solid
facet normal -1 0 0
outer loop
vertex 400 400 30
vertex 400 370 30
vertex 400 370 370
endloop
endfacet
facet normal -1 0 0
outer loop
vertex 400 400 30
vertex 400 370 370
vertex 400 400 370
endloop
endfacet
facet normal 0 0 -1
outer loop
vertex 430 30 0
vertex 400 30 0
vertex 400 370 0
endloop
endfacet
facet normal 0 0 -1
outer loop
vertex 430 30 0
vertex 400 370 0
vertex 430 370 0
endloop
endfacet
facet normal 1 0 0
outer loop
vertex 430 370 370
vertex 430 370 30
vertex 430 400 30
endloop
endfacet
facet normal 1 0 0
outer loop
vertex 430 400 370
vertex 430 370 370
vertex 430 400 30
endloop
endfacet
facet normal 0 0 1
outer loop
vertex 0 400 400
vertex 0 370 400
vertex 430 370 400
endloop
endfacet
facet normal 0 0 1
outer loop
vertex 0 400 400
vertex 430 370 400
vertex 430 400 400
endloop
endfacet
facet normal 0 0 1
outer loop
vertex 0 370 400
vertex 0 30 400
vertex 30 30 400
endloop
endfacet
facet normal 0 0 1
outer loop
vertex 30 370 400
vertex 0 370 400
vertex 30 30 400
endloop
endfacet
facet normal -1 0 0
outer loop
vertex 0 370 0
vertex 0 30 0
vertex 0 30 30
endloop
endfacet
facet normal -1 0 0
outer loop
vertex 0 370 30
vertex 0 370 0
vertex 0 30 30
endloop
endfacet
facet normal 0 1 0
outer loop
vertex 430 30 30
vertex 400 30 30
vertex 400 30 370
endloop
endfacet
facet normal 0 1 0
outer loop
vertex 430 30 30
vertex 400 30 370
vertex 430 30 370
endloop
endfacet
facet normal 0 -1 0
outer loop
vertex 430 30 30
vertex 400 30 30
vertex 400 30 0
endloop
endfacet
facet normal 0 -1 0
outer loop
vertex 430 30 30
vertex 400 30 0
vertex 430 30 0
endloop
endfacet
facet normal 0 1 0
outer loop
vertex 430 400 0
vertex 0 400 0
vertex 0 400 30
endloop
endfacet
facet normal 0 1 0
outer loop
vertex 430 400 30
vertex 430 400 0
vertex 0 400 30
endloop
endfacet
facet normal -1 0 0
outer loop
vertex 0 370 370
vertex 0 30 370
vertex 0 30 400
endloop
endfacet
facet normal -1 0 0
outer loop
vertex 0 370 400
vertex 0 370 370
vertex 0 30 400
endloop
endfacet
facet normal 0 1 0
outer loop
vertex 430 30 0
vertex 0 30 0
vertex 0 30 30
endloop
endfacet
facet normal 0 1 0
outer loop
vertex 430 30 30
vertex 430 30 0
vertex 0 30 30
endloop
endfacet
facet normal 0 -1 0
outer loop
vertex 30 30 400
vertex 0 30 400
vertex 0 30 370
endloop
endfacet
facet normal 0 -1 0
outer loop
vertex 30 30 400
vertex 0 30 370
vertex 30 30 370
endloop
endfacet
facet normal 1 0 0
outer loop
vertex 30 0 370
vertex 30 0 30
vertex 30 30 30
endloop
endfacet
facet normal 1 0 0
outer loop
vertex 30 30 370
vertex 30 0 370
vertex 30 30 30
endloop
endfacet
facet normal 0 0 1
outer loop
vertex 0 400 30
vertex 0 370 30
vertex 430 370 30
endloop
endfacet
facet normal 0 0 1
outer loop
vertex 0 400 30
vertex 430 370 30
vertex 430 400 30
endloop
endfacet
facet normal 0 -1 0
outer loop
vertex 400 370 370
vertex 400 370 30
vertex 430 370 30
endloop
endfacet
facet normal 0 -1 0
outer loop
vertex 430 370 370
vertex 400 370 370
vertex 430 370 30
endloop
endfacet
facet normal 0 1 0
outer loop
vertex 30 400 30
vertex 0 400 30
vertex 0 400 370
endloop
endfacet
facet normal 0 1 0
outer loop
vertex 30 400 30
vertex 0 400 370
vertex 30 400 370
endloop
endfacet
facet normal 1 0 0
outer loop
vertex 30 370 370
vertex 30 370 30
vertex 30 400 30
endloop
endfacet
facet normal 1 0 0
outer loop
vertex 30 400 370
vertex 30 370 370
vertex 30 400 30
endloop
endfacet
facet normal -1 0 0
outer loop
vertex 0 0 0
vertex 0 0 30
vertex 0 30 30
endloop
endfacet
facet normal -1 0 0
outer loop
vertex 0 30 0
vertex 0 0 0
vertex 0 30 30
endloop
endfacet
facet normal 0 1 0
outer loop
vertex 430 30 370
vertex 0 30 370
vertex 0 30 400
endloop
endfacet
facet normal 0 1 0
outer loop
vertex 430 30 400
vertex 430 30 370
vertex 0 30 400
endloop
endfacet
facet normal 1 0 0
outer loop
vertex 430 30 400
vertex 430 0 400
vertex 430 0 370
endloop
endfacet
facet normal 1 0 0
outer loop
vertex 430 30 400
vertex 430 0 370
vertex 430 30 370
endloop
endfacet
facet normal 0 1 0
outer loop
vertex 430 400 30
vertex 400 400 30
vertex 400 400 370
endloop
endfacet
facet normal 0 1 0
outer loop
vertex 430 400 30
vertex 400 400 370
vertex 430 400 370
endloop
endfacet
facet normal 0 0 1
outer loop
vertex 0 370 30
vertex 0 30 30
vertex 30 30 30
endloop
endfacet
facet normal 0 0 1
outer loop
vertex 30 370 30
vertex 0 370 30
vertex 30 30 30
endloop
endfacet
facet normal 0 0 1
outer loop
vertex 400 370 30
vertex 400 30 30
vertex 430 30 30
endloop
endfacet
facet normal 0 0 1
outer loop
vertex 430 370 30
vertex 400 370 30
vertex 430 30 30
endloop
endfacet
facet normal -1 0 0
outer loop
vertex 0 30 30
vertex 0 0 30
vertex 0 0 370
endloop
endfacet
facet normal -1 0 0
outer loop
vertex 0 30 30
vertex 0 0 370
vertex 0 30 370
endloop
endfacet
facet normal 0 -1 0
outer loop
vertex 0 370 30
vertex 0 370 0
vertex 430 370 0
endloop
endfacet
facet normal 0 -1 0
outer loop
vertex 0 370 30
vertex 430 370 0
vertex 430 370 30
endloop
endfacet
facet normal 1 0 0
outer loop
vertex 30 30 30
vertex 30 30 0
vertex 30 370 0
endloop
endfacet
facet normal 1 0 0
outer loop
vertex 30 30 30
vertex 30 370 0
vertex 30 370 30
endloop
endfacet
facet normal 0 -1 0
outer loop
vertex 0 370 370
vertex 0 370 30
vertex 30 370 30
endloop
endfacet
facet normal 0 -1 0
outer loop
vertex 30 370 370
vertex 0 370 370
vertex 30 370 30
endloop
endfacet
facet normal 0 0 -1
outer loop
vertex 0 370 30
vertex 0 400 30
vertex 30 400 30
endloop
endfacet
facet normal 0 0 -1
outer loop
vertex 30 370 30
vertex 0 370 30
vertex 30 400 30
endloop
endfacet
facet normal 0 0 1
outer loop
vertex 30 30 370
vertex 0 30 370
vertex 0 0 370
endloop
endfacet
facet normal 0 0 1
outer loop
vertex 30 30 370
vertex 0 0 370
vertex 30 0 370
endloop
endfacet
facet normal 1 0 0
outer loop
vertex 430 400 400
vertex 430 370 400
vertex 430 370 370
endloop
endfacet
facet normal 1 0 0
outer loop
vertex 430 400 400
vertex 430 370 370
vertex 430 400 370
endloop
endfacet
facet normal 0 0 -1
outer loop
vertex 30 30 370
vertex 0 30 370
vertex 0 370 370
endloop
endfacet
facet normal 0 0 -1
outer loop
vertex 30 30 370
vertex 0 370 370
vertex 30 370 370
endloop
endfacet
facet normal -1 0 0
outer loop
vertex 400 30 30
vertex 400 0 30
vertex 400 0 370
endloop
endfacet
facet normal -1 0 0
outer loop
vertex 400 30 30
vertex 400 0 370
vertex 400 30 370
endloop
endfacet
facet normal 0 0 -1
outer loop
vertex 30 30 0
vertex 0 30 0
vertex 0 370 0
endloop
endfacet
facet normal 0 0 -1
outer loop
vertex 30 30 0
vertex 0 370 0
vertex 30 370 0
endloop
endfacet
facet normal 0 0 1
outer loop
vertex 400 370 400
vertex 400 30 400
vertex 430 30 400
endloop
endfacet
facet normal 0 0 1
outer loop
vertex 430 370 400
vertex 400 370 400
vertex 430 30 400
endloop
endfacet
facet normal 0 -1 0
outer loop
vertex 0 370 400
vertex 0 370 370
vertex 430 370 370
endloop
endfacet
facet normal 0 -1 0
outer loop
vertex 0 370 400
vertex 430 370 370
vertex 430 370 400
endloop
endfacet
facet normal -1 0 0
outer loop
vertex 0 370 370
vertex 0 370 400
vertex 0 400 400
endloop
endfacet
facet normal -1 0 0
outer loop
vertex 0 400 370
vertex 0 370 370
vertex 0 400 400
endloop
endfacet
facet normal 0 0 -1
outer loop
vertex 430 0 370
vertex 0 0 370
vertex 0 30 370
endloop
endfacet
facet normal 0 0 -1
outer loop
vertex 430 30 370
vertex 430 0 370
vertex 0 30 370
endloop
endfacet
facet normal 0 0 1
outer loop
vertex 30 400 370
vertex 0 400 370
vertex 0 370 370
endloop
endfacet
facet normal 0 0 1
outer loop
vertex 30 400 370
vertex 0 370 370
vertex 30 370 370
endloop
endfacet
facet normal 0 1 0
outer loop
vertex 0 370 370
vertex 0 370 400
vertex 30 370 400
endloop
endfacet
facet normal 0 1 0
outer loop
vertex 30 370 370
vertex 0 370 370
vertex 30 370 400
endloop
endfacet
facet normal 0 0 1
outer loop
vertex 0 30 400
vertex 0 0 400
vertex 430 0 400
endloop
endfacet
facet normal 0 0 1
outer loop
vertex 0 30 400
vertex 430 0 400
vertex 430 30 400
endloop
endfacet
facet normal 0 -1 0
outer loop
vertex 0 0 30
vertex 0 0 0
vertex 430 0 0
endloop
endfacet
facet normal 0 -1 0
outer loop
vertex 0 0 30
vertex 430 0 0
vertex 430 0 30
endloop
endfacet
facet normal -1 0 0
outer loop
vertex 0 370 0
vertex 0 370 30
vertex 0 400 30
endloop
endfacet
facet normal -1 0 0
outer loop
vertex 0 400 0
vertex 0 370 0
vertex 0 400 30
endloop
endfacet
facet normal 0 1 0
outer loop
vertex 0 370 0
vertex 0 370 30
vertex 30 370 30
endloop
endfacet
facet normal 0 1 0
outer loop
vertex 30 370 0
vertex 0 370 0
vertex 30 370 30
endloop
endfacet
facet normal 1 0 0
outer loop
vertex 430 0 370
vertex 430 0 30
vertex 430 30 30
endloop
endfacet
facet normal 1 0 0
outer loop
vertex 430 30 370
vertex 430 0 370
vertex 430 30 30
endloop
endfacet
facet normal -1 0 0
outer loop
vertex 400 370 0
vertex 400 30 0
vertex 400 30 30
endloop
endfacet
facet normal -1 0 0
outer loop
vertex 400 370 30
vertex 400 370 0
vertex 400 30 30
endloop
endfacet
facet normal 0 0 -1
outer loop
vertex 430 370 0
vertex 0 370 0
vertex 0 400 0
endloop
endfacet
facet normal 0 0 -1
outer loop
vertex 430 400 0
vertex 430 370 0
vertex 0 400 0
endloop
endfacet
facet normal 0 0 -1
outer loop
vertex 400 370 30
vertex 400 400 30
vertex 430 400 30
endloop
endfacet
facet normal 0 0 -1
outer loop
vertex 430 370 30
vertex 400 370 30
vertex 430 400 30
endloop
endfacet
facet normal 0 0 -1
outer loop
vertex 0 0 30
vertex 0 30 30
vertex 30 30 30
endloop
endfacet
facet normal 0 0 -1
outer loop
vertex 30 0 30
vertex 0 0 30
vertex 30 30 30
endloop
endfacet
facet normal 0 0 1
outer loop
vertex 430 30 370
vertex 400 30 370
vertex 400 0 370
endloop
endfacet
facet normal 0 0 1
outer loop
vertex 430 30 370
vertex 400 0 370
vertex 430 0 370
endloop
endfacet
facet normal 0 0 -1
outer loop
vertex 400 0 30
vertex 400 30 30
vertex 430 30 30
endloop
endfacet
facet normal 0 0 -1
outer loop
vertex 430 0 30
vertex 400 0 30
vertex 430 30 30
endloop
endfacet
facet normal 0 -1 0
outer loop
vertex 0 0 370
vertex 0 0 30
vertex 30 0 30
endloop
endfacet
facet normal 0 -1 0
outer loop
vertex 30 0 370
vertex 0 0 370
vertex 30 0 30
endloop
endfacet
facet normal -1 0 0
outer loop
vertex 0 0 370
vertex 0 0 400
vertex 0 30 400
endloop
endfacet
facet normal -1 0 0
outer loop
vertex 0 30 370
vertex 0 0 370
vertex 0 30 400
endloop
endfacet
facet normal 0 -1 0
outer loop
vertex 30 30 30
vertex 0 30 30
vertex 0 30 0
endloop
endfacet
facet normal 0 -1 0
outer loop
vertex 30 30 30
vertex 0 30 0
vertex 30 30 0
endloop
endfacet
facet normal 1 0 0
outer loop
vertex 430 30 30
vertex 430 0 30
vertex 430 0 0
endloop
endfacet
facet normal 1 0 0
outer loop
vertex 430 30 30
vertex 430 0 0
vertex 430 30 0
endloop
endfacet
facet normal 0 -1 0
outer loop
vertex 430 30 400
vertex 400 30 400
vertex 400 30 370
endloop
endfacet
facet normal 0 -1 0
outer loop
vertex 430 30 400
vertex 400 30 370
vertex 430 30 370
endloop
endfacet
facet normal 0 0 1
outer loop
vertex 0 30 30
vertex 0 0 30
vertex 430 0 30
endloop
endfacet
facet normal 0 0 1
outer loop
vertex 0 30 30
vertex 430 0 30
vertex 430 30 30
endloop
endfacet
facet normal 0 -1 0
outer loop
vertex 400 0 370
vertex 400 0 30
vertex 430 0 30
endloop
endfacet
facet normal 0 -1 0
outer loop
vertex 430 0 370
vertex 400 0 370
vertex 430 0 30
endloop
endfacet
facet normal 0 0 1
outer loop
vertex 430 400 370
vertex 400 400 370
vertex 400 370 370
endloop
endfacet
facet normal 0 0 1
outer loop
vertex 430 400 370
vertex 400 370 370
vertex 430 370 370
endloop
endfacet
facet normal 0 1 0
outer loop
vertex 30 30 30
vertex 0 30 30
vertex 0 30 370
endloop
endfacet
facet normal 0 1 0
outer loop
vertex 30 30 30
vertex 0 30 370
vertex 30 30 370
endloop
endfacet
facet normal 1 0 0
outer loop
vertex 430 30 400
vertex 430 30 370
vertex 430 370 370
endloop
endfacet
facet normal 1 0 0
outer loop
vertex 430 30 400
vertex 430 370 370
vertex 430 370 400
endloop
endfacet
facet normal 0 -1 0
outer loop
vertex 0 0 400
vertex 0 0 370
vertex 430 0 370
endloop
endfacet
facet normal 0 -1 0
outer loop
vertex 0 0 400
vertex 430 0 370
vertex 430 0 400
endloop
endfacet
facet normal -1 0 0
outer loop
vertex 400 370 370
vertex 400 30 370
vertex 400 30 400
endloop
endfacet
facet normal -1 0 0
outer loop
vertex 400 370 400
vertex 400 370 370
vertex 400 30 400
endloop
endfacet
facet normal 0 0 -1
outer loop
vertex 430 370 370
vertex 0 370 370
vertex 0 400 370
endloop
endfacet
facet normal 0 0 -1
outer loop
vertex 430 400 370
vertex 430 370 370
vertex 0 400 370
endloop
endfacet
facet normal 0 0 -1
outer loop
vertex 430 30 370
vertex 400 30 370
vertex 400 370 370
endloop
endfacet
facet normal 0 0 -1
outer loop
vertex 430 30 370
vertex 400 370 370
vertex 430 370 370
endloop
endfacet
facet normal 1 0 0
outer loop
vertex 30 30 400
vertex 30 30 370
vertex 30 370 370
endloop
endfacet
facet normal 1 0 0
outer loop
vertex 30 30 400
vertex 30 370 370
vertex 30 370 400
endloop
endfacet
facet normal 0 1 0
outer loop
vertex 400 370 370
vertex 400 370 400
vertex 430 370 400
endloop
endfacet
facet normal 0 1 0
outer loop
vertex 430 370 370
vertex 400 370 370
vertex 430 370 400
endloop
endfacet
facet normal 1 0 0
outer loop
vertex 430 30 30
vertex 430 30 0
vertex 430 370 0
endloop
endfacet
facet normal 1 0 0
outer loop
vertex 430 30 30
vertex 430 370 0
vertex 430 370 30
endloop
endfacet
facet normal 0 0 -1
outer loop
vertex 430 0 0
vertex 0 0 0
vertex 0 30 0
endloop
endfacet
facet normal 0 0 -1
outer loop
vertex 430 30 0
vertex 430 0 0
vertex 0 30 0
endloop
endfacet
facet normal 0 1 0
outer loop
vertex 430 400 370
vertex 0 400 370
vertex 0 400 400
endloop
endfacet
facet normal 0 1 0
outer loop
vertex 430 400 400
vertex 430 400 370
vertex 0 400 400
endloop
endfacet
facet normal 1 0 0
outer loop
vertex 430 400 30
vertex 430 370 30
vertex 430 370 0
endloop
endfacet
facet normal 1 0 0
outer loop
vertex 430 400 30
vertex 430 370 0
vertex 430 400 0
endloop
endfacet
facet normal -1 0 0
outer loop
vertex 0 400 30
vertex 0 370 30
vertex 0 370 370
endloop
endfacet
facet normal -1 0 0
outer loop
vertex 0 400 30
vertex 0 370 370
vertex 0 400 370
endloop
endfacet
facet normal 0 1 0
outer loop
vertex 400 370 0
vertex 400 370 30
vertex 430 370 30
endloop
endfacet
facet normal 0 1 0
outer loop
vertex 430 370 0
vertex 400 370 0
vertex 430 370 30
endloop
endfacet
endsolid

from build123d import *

# Parameters (mm, degrees)
F3_START = -30
F0_W     = 30
F0_H     = 30
F3_DEPTH = 340
F2_W     = 30
F2_H     = 30
F4_DEPTH = 430
F5_START = 30
F1_W     = 30
F1_H     = 30
F5_DEPTH = 340


with BuildPart() as f3:
    # F0 (on Front) → F3 (new body)
    with BuildSketch(Plane.XZ.offset(F3_START)):
        with Locations((15, 385)):
            Rectangle(F0_W, F0_H)
    extrude(amount=-F3_DEPTH)


with BuildPart() as f3b:
    # F0 (on Front) → F3, piece 2 (new body)
    with BuildSketch(Plane.XZ.offset(F3_START)):
        with Locations((15, 15)):
            Rectangle(F0_W, F0_H)
    extrude(amount=-F3_DEPTH)


with BuildPart() as f3c:
    # F0 (on Front) → F3, piece 3 (new body)
    with BuildSketch(Plane.XZ.offset(F3_START)):
        with Locations((415, 15)):
            Rectangle(F0_W, F0_H)
    extrude(amount=-F3_DEPTH)


with BuildPart() as f3d:
    # F0 (on Front) → F3, piece 4 (new body)
    with BuildSketch(Plane.XZ.offset(F3_START)):
        with Locations((415, 385)):
            Rectangle(F0_W, F0_H)
    extrude(amount=-F3_DEPTH)


with BuildPart() as f4:
    # F2 (on Right) → F4 (new body, through all)
    with BuildSketch(Plane.YZ):
        with Locations((385, 385)):
            Rectangle(F2_W, F2_H)
    extrude(amount=F4_DEPTH)


with BuildPart() as f4b:
    # F2 (on Right) → F4, piece 2 (new body, through all)
    with BuildSketch(Plane.YZ):
        with Locations((385, 15)):
            Rectangle(F2_W, F2_H)
    extrude(amount=F4_DEPTH)


with BuildPart() as f4c:
    # F2 (on Right) → F4, piece 3 (new body, through all)
    with BuildSketch(Plane.YZ):
        with Locations((15, 15)):
            Rectangle(F2_W, F2_H)
    extrude(amount=F4_DEPTH)


with BuildPart() as f4d:
    # F2 (on Right) → F4, piece 4 (new body, through all)
    with BuildSketch(Plane.YZ):
        with Locations((15, 385)):
            Rectangle(F2_W, F2_H)
    extrude(amount=F4_DEPTH)


with BuildPart() as f5:
    # F1 (on Top) → F5 (new body)
    with BuildSketch(Plane.XY.offset(F5_START)):
        with Locations((15, 15)):
            Rectangle(F1_W, F1_H)
    extrude(amount=F5_DEPTH)


with BuildPart() as f5b:
    # F1 (on Top) → F5, piece 2 (new body)
    with BuildSketch(Plane.XY.offset(F5_START)):
        with Locations((415, 15)):
            Rectangle(F1_W, F1_H)
    extrude(amount=F5_DEPTH)


with BuildPart() as f5c:
    # F1 (on Top) → F5, piece 3 (new body)
    with BuildSketch(Plane.XY.offset(F5_START)):
        with Locations((415, 385)):
            Rectangle(F1_W, F1_H)
    extrude(amount=F5_DEPTH)


with BuildPart() as f5d:
    # F1 (on Top) → F5, piece 4 (new body)
    with BuildSketch(Plane.XY.offset(F5_START)):
        with Locations((15, 385)):
            Rectangle(F1_W, F1_H)
    extrude(amount=F5_DEPTH)


solid = Compound([f3.part, f3b.part, f3c.part, f3d.part, f4.part, f4b.part, f4c.part, f4d.part, f5.part, f5b.part, f5c.part, f5d.part])
